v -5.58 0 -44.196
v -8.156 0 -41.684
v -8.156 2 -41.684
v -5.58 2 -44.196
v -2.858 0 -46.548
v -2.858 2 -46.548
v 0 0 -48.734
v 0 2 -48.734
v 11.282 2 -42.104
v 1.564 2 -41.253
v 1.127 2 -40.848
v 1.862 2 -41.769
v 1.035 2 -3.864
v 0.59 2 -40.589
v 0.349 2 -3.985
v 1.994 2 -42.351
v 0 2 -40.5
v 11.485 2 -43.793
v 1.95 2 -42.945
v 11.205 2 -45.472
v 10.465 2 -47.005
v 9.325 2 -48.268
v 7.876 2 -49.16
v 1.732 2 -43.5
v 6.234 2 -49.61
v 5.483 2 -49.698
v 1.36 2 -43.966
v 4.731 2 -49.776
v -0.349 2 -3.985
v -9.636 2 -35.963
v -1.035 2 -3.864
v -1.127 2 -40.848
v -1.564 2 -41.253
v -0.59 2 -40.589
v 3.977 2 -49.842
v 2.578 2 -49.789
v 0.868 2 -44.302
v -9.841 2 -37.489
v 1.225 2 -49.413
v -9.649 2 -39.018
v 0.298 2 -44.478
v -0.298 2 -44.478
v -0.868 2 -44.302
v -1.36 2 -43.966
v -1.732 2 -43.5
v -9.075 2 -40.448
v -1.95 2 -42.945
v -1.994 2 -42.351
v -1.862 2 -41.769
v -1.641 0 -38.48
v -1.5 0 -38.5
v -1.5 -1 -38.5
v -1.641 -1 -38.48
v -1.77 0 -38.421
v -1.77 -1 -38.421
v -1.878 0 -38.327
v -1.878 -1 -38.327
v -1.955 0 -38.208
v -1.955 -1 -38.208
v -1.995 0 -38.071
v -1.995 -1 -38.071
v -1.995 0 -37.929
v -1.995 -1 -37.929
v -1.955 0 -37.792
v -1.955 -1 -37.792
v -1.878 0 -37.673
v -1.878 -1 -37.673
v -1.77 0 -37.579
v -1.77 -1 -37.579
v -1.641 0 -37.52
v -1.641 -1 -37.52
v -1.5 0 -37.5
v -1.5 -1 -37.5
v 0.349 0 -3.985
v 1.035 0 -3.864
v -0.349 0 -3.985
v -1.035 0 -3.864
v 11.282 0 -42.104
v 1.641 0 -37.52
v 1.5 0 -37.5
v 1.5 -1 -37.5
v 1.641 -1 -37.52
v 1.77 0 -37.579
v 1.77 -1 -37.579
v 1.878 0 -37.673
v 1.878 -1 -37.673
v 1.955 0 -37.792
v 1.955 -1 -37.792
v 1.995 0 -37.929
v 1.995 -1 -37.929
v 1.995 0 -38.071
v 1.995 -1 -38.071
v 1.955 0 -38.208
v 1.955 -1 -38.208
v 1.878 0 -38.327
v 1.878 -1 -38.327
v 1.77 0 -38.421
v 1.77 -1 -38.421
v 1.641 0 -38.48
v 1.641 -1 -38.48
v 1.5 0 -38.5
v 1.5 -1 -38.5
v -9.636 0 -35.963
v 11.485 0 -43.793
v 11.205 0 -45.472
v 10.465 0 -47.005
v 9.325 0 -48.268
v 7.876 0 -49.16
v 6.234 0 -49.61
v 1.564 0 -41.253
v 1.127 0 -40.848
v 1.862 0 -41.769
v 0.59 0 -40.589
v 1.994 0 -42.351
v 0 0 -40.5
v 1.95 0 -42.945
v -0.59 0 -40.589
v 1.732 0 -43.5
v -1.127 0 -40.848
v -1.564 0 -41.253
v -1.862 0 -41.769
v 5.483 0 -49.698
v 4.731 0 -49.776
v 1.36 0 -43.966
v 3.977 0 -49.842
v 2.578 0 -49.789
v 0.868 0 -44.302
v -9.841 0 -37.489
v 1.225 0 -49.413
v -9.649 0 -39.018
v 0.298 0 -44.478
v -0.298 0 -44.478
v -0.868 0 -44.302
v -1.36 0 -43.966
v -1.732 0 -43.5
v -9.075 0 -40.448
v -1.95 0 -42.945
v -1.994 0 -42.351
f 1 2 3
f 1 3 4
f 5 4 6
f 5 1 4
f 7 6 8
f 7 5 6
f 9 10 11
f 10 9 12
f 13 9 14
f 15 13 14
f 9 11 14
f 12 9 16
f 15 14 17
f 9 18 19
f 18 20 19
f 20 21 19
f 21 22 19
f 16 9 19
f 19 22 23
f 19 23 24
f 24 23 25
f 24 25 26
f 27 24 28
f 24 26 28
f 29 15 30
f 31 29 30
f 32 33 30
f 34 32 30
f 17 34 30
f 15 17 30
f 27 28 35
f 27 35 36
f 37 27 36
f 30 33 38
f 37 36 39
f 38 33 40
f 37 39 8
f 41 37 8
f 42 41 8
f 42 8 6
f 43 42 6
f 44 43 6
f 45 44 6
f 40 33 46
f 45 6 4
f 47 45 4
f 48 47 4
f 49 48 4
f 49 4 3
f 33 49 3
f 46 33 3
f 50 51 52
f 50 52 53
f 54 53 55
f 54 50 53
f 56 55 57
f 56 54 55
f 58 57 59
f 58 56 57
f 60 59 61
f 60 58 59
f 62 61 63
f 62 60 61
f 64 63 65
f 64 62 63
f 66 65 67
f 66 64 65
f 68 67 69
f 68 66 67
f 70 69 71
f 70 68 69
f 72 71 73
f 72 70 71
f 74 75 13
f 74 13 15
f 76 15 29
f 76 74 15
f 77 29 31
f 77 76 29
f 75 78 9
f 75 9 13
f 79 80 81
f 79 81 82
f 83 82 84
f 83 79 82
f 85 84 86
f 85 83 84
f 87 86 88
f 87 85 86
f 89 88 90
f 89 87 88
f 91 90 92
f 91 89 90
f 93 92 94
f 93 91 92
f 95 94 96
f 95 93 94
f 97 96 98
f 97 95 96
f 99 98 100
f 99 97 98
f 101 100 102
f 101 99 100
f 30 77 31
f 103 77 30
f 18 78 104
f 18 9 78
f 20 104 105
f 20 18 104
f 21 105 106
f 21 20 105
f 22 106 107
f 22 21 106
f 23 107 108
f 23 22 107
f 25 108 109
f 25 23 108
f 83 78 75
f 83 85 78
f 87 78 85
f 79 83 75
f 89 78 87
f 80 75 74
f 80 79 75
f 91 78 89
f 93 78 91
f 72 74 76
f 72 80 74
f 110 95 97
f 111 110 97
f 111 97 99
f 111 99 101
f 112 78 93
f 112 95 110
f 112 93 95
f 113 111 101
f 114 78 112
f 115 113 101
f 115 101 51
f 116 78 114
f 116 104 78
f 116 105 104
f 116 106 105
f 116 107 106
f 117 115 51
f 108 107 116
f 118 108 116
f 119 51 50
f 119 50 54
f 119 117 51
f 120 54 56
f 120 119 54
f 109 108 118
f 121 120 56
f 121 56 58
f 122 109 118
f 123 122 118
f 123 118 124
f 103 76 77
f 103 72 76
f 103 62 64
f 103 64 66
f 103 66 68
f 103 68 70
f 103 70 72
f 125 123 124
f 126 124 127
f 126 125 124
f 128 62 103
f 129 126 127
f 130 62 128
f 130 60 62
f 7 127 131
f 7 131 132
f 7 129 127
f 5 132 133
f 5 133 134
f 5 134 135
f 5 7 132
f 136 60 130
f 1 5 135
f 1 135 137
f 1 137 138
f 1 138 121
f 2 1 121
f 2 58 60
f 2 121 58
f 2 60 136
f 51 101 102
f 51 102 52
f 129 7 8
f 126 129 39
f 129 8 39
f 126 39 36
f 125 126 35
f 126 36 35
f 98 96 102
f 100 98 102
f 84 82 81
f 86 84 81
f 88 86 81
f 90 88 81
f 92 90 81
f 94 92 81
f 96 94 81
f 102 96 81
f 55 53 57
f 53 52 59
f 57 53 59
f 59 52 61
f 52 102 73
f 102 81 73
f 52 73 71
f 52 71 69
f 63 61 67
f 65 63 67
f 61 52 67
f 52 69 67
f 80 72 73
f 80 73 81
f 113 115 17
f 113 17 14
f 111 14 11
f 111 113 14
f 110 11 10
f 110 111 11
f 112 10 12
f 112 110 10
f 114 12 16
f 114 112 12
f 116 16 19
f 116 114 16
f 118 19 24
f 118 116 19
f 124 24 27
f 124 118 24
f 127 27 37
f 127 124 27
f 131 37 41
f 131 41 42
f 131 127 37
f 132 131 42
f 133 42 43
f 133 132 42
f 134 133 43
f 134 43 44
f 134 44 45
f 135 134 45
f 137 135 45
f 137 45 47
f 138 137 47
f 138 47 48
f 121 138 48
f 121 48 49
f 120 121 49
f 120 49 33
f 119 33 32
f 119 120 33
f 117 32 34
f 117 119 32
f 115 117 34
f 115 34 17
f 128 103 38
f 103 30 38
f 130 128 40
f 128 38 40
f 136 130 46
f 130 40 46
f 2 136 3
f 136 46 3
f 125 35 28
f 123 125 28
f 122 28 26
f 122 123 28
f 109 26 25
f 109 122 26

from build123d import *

# Parameters (mm, degrees)
SKETCH1_R           = 2
BOSS_EXTRUDE1_DEPTH = 2
CUT_EXTRUDE1_START  = -2
CUT_EXTRUDE1_DEPTH  = 2
FILLET1_R           = 6
BOSS_EXTRUDE2_DEPTH = 1


# Read off the part's stored shape, not the designer's step: Cut-Extrude1
with BuildPart() as part:
    # Sketch1 → Boss-Extrude1 (new body)
    with BuildSketch(Plane(origin=(0, 0, 0), x_dir=(1, 0, 0), z_dir=(0, 1, 0))):
        with BuildLine():
            Line((-1.03527618, 3.863703305), (-12.940952255, 48.296291314))
            ThreePointArc((-12.940952255, 48.296291314), (0, 50), (12.940952255, 48.296291314))
            Line((12.940952255, 48.296291314), (1.03527618, 3.863703305))
            ThreePointArc((1.03527618, 3.863703305), (0, 4), (-1.03527618, 3.863703305))
        make_face()
        with Locations(Location((0, 42.5, 0), (0, 0, 270))):
            Circle(SKETCH1_R, mode=Mode.SUBTRACT)
    extrude(amount=BOSS_EXTRUDE1_DEPTH)

    # Cut-Extrude1 outline → Cut-Extrude1 (cut)
    with BuildSketch(Plane(origin=(0, 2, 0), x_dir=(1, 0, 0), z_dir=(0, 1, 0)).offset(CUT_EXTRUDE1_START)):
        with BuildLine():
            ThreePointArc((-10.484777097, 39.129720832), (-4.720942194, 44.969397941), (1.785714286, 49.96810207))
            ThreePointArc((1.785714286, 49.96810207), (-5.639908806, 49.680896013), (-12.940952255, 48.296291314))
            Line((-12.940952255, 48.296291314), (-10.484777097, 39.129720832))
        make_face()
    extrude(amount=CUT_EXTRUDE1_DEPTH, mode=Mode.SUBTRACT)

    # Fillet1
    fillet1_edges = [part.edges().sort_by_distance(p)[0] for p in [
        (12.940952255, 1, -48.296291314),
        (-10.484777097, 1, -39.129720832),
        (1.785714286, 1, -49.96810207),
    ]]
    fillet(fillet1_edges, radius=FILLET1_R)

    # Sketch4 → Boss-Extrude2 (add)
    with BuildSketch(Plane.XZ):
        with BuildLine():
            Line((-1.5, -37.5), (1.5, -37.5))
            ThreePointArc((1.5, -37.5), (2, -38), (1.5, -38.5))
            Line((1.5, -38.5), (-1.5, -38.5))
            ThreePointArc((-1.5, -38.5), (-2, -38), (-1.5, -37.5))
        make_face()
    extrude(amount=BOSS_EXTRUDE2_DEPTH)


solid = part.part
